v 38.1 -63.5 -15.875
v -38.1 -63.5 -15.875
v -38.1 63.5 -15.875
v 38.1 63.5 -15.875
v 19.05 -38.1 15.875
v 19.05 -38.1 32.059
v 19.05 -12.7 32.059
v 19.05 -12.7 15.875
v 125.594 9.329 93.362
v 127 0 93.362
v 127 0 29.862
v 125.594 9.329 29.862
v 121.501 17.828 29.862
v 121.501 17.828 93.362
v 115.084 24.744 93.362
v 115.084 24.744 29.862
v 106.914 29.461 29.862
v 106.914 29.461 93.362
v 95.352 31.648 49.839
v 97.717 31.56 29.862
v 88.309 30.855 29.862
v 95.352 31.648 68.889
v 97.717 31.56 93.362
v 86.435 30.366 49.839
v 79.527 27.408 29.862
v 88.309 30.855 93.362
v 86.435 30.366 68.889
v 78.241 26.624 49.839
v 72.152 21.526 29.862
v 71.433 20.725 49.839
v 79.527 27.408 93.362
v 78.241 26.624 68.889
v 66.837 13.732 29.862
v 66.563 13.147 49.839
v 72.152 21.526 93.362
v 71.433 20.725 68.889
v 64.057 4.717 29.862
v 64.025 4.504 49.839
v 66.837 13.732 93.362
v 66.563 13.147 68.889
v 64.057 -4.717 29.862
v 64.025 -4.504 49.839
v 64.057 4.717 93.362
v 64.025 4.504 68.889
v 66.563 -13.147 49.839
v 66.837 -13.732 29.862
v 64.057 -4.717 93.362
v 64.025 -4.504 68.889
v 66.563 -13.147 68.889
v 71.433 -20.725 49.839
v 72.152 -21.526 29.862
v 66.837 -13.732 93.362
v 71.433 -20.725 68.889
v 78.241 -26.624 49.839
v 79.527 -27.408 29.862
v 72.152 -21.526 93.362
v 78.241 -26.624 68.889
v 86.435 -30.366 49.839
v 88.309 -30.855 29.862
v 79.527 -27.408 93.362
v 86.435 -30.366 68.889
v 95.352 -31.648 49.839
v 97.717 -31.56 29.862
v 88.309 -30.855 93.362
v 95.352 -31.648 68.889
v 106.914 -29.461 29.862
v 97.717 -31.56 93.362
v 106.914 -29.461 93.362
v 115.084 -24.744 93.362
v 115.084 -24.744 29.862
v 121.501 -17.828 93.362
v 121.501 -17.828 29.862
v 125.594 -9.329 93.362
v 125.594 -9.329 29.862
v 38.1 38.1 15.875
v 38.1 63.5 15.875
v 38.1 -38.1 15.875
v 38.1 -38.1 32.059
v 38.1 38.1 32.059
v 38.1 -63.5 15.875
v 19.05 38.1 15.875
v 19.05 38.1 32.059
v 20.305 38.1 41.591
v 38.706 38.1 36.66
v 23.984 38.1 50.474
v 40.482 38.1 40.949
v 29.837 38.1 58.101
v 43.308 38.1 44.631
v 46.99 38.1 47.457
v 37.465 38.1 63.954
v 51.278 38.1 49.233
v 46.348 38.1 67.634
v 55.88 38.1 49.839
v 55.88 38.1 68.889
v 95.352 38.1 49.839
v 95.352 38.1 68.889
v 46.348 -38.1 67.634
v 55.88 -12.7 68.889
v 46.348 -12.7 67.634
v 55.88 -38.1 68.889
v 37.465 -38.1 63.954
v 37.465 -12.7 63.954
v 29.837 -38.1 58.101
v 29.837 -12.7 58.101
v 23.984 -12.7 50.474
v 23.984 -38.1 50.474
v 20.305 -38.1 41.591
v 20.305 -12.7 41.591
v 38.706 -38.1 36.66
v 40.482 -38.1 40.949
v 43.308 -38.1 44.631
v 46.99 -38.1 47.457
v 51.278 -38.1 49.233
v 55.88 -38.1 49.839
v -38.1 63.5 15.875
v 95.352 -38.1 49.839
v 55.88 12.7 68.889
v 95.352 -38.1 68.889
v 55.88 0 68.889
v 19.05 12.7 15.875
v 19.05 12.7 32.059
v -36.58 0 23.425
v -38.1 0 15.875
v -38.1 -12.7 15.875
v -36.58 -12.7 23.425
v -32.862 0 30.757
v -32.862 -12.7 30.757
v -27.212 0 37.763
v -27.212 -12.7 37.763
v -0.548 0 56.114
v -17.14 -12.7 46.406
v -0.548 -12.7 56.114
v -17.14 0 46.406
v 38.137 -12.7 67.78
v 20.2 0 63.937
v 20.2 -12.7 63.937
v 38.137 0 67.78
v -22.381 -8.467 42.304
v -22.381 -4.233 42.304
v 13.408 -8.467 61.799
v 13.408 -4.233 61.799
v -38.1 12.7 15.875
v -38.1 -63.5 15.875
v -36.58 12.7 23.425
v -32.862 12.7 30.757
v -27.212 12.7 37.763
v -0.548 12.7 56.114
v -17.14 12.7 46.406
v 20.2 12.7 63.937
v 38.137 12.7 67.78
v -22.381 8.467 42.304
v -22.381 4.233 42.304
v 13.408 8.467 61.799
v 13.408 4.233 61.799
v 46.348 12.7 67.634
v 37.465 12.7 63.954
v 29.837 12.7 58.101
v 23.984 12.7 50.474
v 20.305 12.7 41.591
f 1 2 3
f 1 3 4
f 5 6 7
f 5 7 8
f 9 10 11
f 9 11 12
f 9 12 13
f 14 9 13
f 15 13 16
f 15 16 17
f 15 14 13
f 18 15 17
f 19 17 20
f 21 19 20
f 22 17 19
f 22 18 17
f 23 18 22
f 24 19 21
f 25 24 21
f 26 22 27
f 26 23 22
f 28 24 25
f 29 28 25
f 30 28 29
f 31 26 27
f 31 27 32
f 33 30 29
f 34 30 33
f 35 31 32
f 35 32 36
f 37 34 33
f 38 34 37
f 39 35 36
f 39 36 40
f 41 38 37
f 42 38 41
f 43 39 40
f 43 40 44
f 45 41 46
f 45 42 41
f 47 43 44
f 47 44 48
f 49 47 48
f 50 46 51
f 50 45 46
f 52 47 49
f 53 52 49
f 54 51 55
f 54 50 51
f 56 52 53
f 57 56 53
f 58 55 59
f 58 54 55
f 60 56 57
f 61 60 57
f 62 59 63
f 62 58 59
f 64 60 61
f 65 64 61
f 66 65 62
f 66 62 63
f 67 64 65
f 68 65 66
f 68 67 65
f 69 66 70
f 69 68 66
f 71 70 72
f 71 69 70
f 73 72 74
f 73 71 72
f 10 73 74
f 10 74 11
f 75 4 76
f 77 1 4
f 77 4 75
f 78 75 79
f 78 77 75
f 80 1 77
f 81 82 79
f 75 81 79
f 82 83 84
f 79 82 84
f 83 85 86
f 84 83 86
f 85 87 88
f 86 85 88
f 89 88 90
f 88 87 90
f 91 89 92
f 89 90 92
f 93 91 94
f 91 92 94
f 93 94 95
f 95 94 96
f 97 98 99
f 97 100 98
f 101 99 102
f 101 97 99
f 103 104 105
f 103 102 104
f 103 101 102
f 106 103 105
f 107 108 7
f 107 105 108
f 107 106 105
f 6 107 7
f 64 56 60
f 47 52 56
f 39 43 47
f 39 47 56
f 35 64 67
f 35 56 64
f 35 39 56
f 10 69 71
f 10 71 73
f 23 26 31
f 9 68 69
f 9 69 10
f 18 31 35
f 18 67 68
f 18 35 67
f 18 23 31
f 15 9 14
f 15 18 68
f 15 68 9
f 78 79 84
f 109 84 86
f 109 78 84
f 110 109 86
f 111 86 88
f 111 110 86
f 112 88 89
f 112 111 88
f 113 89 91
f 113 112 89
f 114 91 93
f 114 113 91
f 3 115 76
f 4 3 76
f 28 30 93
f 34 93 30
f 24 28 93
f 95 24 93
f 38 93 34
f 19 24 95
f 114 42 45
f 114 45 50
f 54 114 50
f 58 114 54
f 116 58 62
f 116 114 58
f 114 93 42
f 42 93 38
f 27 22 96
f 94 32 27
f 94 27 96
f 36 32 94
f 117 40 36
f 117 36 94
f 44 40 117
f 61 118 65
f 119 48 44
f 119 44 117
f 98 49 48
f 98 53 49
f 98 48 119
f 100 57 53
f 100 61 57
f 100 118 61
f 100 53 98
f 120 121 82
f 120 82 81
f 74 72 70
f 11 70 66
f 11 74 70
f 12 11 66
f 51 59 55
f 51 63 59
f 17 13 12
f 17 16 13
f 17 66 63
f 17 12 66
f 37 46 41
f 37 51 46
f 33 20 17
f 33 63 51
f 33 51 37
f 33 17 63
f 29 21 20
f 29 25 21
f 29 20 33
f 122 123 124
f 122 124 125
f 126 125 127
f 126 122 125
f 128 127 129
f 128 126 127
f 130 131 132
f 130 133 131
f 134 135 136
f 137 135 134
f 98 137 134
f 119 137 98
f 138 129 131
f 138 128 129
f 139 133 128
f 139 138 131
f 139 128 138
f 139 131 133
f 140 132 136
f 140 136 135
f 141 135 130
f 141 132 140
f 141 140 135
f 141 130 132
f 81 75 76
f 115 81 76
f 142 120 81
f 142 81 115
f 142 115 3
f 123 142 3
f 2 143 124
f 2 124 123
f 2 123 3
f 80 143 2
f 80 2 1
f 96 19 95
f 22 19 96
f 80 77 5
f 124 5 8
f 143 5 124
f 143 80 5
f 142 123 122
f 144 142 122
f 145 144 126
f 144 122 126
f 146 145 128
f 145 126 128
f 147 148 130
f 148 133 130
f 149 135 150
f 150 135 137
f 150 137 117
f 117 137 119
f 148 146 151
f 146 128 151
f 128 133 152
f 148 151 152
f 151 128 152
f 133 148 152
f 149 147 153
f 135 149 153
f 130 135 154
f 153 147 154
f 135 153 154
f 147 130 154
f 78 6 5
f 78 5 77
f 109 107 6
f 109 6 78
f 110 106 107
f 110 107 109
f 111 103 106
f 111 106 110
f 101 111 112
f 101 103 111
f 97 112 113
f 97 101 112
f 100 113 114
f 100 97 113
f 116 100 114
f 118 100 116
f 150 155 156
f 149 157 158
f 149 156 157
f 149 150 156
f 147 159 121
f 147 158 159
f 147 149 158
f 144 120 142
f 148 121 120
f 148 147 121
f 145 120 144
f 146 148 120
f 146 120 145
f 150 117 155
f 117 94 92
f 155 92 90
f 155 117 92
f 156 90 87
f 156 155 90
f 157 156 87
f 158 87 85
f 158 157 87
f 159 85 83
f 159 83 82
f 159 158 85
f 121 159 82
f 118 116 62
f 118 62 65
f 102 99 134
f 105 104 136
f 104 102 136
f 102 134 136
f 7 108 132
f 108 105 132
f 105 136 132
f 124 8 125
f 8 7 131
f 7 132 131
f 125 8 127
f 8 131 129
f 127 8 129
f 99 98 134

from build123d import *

# Parameters (mm, degrees)
F1_DEPTH = 63.5
F0_W     = 19.151572957
F0_H     = 19.05
F2_DEPTH = 38.1
F3_DEPTH = 12.7


with BuildPart() as f1:
    # F0 (on Front) → F1 (new body, symmetric)
    with BuildSketch(Plane.XZ):
        Polygon((19.05, 15.875), (-38.1, 15.875), (-38.1, -15.875), (38.1, -15.875), (38.1, 15.875), align=None)
    extrude(amount=F1_DEPTH, both=True)

    # F0 (on Front) → F2 (join, symmetric)
    with BuildSketch(Plane.XZ):
        with BuildLine():
            Line((19.05, 32.0585994233), (19.05, 15.875))
            Line((19.05, 15.875), (38.1, 15.875))
            Line((38.1, 15.875), (38.1, 32.0585994233))
            ThreePointArc((38.1, 32.0585994233), (43.3076414305, 44.6309579928), (55.88, 49.8385994233))
            Line((55.88, 49.8385994233), (76.2, 49.8385994233))
            Line((76.2, 49.8385994233), (76.2, 68.8885994233))
            Line((76.2, 68.8885994233), (55.88, 68.8885994233))
            ThreePointArc((55.88, 68.8885994233), (29.8372572489, 58.1013421744), (19.05, 32.0585994233))
        make_face()
        with Locations((85.7757864785, 59.3635994233)):
            Rectangle(F0_W, F0_H)
    extrude(amount=F2_DEPTH, both=True)

    # F0 (on Front) → F3 (join, symmetric)
    with BuildSketch(Plane.XZ):
        with BuildLine():
            add(Edge.make_bspline(
                [(-38.1, 15.875), (-36.8803367019, 43.9477860928), (14.5305916667, 69.8257684708), (55.88, 68.8885994233)],
                knots=[0, 0, 0, 0, 107.9012609927, 107.9012609927, 107.9012609927, 107.9012609927], degree=3))
            Line((-38.1, 15.875), (19.05, 15.875))
            Line((19.05, 15.875), (19.05, 32.0585994233))
            ThreePointArc((19.05, 32.0585994233), (29.8372572489, 58.1013421744), (55.88, 68.8885994233))
        make_face()
    extrude(amount=F3_DEPTH, both=True)

    # F0 (on Front) → F4 (revolve)
    with BuildSketch(Plane.XZ):
        Polygon((95.351572957, 93.3624118266), (95.351572957, 68.8885994233), (95.351572957, 49.8385994233), (95.351572957, 29.8624118266), (127, 29.8624118266), (127, 93.3624118266), align=None)
    revolve(axis=Axis((95.351572957, 0, 61.6124118266), (0, 0, 1)))


solid = f1.part
